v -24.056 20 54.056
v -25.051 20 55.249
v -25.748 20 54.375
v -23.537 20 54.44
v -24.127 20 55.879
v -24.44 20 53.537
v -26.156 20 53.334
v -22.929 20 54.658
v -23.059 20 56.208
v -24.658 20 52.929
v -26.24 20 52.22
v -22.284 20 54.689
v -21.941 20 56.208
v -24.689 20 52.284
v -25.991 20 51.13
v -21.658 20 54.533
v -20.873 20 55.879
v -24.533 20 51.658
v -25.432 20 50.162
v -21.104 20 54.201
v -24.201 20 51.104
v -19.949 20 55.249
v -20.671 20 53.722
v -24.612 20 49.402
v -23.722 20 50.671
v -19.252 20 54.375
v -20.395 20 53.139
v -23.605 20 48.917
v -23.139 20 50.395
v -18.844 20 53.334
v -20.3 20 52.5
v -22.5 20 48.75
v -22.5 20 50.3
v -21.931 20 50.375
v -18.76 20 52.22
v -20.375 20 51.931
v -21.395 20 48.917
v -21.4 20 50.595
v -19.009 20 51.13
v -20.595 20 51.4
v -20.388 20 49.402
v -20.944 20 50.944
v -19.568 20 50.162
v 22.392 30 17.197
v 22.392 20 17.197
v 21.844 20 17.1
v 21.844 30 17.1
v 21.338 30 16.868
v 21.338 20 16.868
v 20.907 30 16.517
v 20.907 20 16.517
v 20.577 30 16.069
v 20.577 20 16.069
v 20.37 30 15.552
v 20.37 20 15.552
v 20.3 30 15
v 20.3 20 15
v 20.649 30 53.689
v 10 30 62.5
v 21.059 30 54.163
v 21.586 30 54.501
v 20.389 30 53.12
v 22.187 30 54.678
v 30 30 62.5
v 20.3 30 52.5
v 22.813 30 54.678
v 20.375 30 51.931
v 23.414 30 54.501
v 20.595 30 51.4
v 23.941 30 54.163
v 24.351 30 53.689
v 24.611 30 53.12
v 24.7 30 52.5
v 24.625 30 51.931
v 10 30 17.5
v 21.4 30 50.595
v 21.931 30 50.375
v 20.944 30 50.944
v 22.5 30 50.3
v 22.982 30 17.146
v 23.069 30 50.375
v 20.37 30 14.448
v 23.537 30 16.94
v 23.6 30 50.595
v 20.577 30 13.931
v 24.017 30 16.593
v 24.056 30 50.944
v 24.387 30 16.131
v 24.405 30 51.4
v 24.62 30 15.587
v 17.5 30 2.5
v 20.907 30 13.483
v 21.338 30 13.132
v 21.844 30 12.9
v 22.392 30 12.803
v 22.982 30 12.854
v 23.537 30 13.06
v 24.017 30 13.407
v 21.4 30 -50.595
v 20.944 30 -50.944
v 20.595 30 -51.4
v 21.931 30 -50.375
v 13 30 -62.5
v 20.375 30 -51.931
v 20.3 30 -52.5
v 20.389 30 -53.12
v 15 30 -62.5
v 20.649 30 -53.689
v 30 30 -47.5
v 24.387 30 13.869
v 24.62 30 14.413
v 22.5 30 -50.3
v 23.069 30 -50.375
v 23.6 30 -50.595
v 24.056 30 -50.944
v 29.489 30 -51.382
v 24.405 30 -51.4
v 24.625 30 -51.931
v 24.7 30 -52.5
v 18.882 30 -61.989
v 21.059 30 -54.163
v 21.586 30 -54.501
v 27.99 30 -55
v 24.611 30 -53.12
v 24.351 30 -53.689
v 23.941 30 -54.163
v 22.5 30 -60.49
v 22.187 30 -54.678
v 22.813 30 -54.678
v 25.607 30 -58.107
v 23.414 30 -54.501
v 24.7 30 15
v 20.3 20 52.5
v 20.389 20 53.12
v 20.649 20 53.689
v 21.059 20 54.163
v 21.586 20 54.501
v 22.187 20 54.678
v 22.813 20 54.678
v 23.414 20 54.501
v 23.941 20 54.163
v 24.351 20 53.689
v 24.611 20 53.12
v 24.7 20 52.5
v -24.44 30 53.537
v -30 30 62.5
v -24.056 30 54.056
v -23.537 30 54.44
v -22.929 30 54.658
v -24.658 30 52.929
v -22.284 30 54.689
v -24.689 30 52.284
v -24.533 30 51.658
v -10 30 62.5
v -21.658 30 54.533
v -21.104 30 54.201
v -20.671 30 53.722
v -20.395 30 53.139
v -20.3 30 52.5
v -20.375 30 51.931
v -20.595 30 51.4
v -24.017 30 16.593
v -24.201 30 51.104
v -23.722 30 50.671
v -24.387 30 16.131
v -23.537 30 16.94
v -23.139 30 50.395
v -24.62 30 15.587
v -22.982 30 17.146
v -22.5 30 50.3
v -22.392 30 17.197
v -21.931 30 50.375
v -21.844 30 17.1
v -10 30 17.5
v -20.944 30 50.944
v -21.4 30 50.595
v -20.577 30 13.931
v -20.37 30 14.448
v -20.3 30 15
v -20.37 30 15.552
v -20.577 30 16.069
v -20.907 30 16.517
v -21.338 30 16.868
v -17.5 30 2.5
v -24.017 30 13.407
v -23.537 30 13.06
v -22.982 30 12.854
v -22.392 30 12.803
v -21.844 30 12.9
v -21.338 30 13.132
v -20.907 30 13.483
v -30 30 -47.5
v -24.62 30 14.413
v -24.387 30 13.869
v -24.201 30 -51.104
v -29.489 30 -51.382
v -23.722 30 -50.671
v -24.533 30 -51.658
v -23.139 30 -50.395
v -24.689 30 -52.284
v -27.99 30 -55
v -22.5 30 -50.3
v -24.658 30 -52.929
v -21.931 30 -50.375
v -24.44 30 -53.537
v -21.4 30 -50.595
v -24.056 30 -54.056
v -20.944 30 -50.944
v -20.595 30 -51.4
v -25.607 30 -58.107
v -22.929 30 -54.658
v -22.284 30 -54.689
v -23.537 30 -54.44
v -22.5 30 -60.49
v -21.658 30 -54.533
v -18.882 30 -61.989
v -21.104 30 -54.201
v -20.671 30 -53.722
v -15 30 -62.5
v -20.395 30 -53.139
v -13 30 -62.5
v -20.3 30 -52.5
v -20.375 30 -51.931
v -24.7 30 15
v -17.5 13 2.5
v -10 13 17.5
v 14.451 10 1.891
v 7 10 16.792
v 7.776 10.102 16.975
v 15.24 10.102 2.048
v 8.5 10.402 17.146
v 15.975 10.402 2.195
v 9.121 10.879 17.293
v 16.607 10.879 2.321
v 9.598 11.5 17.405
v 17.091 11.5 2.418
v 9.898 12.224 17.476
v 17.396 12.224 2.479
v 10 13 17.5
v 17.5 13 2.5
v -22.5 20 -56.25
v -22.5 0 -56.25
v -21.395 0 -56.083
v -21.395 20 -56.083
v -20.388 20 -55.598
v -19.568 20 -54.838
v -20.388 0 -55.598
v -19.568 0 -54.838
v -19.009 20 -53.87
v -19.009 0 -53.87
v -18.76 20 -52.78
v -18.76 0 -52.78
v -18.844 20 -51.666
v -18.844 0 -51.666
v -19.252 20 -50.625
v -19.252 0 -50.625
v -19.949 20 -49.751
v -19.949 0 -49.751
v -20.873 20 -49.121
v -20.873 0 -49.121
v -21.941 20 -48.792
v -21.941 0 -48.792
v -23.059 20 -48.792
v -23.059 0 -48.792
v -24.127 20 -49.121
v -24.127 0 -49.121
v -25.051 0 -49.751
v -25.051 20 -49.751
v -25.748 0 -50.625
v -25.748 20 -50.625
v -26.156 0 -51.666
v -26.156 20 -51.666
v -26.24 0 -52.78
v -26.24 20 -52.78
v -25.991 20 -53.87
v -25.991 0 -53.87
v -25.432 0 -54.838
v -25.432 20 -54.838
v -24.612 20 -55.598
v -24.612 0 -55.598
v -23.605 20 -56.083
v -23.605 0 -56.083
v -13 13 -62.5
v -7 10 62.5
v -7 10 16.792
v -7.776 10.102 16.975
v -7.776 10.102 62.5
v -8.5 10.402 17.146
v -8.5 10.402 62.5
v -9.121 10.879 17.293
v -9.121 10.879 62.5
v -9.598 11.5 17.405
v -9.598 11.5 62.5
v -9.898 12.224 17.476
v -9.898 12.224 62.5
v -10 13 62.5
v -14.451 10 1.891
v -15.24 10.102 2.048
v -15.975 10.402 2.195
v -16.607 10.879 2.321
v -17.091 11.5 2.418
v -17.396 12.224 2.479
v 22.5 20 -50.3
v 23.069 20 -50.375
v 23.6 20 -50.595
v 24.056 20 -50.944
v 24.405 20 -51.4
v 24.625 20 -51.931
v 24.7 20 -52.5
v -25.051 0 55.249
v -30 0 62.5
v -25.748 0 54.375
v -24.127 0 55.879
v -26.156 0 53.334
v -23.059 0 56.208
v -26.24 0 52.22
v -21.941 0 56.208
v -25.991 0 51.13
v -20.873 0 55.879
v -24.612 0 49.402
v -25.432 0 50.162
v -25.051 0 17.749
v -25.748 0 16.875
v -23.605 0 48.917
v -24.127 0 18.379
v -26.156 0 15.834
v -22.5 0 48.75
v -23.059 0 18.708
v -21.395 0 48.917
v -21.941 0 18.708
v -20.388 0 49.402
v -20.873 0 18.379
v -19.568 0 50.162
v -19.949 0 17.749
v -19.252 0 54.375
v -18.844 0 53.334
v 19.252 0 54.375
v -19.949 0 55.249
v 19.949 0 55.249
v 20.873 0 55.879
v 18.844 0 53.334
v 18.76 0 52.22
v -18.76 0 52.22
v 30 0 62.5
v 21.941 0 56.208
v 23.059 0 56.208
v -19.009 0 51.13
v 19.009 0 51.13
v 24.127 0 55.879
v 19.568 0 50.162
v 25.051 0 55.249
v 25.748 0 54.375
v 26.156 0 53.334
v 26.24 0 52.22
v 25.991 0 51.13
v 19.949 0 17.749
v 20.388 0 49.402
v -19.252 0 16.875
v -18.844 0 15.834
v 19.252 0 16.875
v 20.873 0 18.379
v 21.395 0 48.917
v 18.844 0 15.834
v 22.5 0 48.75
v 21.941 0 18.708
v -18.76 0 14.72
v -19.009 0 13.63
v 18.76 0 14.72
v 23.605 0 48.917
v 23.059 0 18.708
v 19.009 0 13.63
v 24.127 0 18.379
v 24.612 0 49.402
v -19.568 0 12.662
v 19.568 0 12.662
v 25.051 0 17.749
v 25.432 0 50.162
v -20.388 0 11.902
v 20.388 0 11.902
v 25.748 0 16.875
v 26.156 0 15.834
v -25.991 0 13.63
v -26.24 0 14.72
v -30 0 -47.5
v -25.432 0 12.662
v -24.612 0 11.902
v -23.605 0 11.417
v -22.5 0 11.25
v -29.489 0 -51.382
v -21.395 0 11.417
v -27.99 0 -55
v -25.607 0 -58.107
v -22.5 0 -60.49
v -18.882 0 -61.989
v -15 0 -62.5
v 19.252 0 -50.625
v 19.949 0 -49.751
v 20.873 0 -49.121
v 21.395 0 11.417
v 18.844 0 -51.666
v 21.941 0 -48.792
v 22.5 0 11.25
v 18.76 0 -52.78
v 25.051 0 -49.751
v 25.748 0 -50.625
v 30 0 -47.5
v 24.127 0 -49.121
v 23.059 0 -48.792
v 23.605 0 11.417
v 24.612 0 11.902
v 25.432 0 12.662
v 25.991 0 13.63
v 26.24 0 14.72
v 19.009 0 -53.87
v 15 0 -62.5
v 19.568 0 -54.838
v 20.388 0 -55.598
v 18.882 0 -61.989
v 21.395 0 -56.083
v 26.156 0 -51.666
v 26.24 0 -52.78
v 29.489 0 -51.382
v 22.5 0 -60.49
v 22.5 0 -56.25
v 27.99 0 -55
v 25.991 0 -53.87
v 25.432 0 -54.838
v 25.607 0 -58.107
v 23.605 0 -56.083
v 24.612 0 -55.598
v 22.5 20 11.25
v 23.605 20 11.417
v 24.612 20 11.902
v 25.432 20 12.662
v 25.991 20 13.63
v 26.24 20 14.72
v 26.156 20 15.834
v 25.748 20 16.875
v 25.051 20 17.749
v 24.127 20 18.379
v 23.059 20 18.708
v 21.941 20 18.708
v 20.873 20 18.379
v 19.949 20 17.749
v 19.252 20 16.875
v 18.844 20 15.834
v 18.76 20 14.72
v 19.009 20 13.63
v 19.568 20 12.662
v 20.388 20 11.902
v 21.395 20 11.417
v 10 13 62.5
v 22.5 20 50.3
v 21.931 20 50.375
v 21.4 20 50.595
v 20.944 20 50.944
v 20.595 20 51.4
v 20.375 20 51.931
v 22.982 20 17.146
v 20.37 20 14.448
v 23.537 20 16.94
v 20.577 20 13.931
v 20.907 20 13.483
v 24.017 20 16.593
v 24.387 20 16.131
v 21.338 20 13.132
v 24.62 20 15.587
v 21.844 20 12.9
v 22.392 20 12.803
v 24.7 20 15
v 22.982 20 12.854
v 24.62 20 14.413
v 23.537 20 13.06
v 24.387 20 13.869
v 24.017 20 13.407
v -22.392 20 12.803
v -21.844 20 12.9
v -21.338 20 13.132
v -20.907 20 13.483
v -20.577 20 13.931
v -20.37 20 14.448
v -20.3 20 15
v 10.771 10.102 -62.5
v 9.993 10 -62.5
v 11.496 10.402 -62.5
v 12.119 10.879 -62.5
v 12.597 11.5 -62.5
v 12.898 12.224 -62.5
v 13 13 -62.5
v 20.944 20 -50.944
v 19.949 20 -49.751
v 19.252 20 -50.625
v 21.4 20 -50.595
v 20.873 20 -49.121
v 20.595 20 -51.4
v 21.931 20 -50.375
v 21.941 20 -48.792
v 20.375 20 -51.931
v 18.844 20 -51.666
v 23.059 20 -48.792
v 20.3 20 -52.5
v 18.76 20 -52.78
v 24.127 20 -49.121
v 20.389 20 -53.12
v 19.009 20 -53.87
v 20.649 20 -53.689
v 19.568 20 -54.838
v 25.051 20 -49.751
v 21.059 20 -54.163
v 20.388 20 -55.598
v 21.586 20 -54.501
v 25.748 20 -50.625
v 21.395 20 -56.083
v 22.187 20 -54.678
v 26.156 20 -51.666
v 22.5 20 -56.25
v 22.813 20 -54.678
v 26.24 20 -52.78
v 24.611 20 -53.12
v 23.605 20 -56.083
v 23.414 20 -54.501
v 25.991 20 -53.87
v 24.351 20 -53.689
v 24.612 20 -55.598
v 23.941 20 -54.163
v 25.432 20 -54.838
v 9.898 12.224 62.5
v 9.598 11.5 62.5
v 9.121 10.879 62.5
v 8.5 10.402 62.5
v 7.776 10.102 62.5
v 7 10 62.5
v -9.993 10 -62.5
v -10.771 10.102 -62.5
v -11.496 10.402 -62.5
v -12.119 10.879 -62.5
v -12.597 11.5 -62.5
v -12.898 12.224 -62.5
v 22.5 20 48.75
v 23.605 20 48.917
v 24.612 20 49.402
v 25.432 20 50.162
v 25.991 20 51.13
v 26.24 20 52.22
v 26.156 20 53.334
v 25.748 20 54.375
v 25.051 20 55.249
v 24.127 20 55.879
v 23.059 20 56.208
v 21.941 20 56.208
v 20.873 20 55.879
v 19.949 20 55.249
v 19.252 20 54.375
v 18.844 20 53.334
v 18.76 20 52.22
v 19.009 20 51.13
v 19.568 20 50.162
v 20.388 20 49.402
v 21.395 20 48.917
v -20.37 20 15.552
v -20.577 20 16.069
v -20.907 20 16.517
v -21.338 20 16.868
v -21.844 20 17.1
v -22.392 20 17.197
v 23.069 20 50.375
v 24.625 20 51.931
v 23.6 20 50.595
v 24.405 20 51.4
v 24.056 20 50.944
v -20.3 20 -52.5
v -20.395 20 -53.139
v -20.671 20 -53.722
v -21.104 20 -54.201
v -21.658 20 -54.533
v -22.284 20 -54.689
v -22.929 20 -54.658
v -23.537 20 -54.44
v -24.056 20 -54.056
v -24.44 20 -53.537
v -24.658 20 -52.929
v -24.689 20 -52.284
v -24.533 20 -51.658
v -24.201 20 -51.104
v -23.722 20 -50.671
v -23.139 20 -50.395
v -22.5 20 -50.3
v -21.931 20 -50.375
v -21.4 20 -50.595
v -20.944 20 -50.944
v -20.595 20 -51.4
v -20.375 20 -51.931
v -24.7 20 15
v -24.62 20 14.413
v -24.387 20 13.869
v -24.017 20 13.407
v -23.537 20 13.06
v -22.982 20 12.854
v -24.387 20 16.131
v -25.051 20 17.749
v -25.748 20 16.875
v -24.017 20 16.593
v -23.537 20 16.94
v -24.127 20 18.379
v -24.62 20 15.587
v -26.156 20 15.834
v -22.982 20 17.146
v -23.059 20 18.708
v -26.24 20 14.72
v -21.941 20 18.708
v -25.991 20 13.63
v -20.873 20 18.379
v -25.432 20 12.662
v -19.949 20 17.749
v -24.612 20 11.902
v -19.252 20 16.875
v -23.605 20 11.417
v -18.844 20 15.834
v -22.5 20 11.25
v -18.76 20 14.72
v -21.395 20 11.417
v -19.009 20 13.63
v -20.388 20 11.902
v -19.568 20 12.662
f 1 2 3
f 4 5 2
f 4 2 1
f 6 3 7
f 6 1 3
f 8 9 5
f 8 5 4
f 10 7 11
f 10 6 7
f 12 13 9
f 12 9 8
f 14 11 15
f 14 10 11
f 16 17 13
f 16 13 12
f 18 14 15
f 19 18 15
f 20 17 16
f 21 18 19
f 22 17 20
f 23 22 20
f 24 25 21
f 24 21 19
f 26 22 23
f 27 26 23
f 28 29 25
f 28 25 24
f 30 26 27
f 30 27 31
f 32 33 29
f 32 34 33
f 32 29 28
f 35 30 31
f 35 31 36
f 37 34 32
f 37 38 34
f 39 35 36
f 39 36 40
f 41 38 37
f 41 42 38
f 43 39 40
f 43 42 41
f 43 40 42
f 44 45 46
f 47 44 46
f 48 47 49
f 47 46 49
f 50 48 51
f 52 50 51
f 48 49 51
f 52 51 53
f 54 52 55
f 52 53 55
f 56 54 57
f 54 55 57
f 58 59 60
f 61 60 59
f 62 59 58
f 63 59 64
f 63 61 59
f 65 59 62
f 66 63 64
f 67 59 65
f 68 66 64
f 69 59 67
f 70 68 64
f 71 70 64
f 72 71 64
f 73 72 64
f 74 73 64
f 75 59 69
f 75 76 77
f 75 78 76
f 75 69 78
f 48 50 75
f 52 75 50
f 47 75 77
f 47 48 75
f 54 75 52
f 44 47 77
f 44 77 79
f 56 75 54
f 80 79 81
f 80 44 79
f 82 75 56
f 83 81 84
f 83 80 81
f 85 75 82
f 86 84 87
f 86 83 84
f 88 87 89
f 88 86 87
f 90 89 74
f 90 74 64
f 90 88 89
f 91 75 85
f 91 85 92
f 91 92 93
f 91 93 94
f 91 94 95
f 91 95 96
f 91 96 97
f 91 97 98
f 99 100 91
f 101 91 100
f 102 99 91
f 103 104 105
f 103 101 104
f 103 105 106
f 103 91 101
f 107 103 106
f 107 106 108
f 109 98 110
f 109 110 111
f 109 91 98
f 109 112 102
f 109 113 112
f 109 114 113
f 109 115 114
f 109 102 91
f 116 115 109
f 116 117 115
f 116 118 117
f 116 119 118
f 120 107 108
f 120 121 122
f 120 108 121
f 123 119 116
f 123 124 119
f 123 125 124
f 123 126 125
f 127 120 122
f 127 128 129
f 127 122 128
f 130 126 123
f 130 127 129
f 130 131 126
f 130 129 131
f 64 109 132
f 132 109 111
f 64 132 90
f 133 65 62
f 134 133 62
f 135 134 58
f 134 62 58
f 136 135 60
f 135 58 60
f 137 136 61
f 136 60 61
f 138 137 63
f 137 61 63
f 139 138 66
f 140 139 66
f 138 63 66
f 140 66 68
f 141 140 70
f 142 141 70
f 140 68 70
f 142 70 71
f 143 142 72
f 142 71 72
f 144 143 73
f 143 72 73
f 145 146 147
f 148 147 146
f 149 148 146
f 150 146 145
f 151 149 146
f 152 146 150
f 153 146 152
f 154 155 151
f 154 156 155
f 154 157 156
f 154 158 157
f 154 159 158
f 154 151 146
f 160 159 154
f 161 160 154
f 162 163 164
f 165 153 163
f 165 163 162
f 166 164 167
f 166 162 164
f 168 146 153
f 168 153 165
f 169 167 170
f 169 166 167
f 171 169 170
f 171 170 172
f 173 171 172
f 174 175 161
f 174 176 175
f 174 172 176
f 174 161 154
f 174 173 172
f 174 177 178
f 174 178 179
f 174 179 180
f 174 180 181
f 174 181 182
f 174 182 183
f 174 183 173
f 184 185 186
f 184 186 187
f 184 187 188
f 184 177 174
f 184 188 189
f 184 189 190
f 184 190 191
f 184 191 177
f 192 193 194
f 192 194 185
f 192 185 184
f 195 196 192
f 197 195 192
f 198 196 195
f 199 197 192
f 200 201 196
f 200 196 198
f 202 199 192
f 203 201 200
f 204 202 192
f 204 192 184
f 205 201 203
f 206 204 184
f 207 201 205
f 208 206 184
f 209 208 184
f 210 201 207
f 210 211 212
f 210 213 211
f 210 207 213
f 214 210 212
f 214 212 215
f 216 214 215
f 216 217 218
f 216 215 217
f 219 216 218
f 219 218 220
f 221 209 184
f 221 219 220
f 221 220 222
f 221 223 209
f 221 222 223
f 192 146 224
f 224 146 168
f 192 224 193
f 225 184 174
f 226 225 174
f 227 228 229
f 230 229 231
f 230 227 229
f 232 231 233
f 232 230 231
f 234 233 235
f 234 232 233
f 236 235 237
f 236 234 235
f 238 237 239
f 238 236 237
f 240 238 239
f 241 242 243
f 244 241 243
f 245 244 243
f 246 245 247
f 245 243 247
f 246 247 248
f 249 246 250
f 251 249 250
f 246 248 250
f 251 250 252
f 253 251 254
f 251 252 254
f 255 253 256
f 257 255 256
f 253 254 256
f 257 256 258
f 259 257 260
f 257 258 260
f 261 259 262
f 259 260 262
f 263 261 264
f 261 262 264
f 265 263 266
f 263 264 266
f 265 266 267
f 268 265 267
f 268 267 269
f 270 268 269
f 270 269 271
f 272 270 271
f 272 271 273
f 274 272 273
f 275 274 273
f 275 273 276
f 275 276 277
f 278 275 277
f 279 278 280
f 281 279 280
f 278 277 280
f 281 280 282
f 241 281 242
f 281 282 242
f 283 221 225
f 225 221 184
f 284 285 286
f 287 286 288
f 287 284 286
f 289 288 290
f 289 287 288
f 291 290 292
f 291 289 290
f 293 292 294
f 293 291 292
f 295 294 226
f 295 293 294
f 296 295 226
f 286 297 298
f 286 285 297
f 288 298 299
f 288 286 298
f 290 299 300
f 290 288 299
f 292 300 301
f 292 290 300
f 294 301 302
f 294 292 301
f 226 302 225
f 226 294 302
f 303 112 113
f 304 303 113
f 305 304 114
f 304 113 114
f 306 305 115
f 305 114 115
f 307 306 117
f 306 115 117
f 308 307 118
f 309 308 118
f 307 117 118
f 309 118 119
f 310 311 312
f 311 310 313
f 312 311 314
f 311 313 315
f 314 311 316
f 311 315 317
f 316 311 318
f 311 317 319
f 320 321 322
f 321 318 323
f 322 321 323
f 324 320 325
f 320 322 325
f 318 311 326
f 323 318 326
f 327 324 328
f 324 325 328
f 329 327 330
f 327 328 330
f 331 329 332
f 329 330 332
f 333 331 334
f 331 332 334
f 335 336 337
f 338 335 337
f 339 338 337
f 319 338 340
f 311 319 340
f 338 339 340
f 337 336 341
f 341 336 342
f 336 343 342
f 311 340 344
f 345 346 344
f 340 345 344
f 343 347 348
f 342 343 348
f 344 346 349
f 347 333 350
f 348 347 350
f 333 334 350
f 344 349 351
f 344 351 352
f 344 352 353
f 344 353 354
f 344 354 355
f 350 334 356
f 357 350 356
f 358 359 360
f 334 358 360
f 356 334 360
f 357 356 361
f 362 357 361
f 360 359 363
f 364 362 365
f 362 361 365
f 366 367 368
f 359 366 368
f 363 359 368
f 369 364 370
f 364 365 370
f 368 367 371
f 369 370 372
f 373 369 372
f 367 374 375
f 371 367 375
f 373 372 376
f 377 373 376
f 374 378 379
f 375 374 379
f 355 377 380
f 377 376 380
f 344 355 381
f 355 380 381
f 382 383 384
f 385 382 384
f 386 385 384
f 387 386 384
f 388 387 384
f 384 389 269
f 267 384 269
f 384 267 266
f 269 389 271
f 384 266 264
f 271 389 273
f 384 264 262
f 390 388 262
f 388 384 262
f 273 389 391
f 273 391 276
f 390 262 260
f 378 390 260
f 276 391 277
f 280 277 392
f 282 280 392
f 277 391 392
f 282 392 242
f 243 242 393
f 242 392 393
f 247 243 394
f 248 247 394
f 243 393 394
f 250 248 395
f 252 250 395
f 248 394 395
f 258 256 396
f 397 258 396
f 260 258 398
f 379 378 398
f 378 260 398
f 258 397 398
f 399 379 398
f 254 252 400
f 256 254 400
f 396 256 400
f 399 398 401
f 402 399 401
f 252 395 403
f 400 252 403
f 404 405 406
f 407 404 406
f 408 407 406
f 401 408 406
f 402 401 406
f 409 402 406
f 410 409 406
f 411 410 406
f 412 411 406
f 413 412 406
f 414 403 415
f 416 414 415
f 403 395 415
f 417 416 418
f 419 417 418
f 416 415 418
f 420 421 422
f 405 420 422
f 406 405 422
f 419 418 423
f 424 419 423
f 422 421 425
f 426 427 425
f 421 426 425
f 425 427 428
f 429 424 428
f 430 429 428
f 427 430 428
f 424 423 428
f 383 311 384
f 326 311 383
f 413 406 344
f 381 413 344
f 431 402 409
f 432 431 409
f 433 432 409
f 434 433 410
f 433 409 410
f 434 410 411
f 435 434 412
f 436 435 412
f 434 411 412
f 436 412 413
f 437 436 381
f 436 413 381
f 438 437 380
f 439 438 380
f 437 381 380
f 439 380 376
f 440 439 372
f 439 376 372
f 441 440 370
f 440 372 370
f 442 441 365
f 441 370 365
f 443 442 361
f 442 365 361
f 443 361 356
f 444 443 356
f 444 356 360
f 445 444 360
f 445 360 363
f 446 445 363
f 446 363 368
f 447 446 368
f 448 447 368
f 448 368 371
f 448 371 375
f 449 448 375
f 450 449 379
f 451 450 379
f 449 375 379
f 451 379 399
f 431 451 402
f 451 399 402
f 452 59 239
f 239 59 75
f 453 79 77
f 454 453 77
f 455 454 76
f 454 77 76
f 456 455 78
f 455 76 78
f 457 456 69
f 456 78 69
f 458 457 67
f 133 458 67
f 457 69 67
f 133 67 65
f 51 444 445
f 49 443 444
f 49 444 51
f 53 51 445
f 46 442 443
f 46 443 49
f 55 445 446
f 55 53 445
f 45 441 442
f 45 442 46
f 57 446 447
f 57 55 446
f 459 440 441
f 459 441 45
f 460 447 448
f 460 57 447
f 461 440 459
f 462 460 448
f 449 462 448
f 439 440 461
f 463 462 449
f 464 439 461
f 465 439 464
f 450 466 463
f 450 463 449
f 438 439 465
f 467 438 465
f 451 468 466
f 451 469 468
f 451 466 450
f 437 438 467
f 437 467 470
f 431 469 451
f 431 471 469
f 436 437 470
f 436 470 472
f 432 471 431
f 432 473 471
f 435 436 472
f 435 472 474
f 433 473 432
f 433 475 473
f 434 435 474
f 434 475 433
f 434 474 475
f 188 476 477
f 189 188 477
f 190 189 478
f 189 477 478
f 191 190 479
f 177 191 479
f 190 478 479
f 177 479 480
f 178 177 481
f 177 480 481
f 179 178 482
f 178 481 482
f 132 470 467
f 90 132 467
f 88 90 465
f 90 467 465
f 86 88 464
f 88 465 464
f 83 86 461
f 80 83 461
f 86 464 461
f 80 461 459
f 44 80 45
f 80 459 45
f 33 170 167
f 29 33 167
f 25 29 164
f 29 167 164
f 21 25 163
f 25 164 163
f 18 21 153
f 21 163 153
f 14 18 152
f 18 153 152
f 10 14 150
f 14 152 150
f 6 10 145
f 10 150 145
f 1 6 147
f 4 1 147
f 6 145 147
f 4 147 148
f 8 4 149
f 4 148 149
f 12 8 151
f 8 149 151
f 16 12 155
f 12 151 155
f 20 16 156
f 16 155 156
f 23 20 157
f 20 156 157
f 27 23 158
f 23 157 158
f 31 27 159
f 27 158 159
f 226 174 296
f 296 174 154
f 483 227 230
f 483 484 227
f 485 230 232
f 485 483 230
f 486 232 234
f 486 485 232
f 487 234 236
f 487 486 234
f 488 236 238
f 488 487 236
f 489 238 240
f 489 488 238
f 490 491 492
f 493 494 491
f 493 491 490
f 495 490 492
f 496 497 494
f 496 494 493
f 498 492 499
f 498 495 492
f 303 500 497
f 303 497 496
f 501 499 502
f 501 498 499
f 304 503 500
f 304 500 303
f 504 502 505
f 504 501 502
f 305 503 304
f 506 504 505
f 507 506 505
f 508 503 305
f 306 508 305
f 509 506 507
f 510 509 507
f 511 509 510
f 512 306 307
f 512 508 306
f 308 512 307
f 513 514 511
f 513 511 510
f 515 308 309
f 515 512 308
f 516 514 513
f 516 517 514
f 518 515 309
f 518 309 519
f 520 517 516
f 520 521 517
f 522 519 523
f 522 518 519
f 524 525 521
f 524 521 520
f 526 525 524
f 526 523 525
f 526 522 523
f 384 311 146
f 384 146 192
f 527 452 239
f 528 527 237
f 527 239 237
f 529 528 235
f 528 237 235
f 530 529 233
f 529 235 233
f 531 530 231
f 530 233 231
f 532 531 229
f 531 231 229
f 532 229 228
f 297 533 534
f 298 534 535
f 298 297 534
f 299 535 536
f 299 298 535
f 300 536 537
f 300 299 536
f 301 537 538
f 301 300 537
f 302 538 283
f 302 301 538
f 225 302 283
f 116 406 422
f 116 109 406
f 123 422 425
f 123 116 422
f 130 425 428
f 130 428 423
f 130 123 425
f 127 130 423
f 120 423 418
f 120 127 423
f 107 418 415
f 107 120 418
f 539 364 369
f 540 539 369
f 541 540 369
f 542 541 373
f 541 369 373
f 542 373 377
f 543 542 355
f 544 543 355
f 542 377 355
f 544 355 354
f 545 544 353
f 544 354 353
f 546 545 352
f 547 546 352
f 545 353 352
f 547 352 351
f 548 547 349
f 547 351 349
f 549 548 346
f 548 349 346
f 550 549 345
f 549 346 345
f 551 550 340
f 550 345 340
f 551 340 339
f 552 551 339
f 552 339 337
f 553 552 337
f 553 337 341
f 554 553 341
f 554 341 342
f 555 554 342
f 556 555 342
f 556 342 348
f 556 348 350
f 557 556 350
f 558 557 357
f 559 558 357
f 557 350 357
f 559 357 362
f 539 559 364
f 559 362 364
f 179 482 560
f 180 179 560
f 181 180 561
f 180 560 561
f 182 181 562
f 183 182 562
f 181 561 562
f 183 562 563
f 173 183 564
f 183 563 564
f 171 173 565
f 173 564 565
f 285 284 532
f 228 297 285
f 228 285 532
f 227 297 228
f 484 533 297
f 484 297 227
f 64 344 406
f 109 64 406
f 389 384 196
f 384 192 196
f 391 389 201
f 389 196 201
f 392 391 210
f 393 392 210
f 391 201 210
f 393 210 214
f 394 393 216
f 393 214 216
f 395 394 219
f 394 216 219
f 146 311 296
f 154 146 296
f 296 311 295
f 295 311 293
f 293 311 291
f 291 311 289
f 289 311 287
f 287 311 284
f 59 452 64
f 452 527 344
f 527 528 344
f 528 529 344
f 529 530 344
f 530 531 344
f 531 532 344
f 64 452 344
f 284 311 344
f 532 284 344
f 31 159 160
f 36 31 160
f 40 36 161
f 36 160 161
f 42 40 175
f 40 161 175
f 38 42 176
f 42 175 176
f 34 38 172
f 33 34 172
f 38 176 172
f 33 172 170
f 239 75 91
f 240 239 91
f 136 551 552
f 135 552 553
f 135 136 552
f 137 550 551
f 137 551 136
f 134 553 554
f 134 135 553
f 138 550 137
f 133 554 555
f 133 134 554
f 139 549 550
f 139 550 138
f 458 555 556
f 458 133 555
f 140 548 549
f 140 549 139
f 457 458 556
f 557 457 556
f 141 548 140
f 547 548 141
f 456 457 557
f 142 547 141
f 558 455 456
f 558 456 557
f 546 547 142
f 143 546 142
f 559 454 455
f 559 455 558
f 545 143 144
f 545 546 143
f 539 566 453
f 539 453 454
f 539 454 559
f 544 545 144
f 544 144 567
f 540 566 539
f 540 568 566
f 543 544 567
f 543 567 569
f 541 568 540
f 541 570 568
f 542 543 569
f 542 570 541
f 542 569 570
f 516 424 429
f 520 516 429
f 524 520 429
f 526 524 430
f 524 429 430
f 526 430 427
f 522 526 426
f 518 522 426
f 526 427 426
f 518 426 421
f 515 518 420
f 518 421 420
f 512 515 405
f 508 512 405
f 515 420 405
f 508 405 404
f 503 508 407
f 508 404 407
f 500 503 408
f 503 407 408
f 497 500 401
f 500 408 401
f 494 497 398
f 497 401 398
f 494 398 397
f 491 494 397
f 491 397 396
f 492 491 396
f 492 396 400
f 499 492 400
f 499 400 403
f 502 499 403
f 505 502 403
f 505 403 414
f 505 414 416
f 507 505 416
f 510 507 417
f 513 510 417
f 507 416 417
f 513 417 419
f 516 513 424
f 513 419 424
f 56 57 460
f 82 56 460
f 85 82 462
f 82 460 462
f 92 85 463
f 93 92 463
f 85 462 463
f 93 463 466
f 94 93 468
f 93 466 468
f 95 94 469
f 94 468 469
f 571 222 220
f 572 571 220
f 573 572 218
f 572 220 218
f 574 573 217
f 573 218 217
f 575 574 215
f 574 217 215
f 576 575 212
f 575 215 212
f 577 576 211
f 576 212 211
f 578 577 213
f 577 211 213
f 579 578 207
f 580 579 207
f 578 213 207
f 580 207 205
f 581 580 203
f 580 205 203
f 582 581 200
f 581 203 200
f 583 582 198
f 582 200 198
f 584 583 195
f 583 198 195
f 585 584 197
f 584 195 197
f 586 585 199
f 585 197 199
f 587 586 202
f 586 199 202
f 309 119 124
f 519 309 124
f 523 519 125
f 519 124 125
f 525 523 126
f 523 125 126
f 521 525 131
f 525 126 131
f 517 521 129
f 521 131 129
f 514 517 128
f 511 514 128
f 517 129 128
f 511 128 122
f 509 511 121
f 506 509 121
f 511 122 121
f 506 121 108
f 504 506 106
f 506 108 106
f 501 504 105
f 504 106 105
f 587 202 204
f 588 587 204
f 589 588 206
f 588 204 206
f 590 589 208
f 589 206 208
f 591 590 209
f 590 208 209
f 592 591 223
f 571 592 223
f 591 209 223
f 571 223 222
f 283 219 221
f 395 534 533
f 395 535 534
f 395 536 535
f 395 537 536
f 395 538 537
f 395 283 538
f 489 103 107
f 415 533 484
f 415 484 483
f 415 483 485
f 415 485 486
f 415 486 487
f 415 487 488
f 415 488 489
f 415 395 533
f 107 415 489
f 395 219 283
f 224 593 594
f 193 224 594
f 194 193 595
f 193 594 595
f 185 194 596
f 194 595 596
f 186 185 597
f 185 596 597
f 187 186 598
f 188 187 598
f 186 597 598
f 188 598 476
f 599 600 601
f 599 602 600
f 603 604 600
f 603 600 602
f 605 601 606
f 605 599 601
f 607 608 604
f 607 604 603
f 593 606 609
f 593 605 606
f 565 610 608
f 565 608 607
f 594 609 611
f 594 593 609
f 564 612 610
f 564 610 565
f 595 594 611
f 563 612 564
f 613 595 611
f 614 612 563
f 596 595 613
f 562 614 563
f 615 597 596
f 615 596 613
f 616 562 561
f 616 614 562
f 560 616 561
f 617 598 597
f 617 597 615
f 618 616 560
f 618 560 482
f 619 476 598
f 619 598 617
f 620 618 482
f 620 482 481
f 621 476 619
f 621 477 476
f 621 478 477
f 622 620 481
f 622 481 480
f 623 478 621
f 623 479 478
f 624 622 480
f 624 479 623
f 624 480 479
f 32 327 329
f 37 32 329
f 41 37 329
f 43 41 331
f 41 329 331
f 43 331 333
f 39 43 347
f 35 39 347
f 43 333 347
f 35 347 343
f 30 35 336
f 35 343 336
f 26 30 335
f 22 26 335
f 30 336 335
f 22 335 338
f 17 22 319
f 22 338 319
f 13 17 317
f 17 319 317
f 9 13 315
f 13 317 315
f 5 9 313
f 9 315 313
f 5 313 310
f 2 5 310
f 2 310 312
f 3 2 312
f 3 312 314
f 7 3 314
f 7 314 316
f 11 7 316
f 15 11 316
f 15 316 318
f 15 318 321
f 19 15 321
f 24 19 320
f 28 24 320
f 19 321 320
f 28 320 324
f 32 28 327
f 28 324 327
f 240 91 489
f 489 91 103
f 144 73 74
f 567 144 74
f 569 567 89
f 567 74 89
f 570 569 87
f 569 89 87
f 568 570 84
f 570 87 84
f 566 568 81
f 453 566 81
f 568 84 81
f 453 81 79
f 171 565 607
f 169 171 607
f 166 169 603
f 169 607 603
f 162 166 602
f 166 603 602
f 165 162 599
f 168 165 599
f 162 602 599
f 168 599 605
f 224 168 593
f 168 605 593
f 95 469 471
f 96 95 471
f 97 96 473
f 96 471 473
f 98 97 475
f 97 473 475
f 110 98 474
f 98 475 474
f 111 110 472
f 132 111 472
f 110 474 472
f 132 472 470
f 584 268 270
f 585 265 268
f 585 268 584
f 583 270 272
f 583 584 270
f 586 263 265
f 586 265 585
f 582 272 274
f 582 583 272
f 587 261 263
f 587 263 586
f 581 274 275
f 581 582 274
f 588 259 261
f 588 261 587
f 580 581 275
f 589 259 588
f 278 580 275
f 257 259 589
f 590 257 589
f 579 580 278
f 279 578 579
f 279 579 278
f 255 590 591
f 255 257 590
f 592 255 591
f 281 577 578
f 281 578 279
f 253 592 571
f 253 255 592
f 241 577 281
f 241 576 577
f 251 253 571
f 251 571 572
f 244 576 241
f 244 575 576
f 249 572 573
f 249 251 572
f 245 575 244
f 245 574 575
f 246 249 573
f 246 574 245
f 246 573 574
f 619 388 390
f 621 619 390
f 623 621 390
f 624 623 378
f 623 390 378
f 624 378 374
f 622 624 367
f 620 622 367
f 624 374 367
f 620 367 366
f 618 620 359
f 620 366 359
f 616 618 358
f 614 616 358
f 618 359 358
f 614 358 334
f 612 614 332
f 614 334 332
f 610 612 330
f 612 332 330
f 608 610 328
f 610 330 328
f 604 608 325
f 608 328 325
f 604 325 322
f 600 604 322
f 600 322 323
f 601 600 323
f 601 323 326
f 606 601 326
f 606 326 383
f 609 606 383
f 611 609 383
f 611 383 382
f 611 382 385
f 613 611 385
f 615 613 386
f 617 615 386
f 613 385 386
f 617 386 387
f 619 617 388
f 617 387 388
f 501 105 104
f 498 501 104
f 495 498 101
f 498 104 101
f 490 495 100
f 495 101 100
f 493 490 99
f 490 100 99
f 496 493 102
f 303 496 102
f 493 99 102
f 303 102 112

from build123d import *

# Parameters (mm, degrees)
SKETCH_1_W          = 60
SKETCH_1_H          = 125
EXTRUDE_1_DEPTH     = 30
CUT_EXTRUDE_1_DEPTH = 76.539724649
CUT_EXTRUDE_2_DEPTH = 76.539724649
SKETCH_4_W          = 13
SKETCH_4_H          = 65
CUT_EXTRUDE_3_DEPTH = 20
FILLET_1_R          = 3
FILLET_2_R          = 15
SKETCH_5_R          = 3.75
CUT_EXTRUDE_4_DEPTH = 20


with BuildPart() as part:
    # 草图1 → 凸台-拉伸1 (new body)
    with BuildSketch(Plane(origin=(0, 0, 0), x_dir=(1, 0, 0), z_dir=(0, 1, 0))):
        Rectangle(SKETCH_1_W, SKETCH_1_H)
    extrude(amount=EXTRUDE_1_DEPTH)

    # 草图2 → 切除-拉伸1 (cut, through all)
    with BuildSketch(Plane(origin=(0, 30, 0), x_dir=(1, 0, 0), z_dir=(0, 1, 0))):
        with BuildLine():
            ThreePointArc((-20.3, -52.5), (-20.944365081, -50.944365081), (-22.5, -50.3))
            Line((-22.5, -50.3), (-22.5, -52.5))
            Line((-22.5, -52.5), (-20.3, -52.5))
        make_face()
        with BuildLine():
            Line((-22.5, -52.5), (-22.5, -50.3))
            ThreePointArc((-22.5, -50.3), (-24.055634919, -54.055634919), (-20.3, -52.5))
            Line((-20.3, -52.5), (-22.5, -52.5))
        make_face()
        with BuildLine():
            ThreePointArc((24.7, -52.5), (24.055634919, -50.944365081), (22.5, -50.3))
            Line((22.5, -50.3), (22.5, -52.5))
            Line((22.5, -52.5), (20.3, -52.5))
            ThreePointArc((20.3, -52.5), (22.5, -54.7), (24.7, -52.5))
        make_face()
        with BuildLine():
            Line((22.5, -52.5), (22.5, -50.3))
            ThreePointArc((22.5, -50.3), (20.944365081, -50.944365081), (20.3, -52.5))
            Line((20.3, -52.5), (22.5, -52.5))
        make_face()
        with BuildLine():
            ThreePointArc((-20.3, 52.5), (-24.055634919, 54.055634919), (-22.5, 50.3))
            Line((-22.5, 50.3), (-22.5, 52.5))
            Line((-22.5, 52.5), (-20.3, 52.5))
        make_face()
        with BuildLine():
            Line((-22.5, 52.5), (-22.5, 50.3))
            ThreePointArc((-22.5, 50.3), (-20.944365081, 50.944365081), (-20.3, 52.5))
            Line((-20.3, 52.5), (-22.5, 52.5))
        make_face()
        with BuildLine():
            ThreePointArc((20.3, 52.5), (20.944365081, 50.944365081), (22.5, 50.3))
            Line((22.5, 50.3), (22.5, 52.5))
            Line((22.5, 52.5), (20.3, 52.5))
        make_face()
        with BuildLine():
            Line((22.5, 52.5), (22.5, 50.3))
            ThreePointArc((22.5, 50.3), (24.055634919, 50.944365081), (24.7, 52.5))
            ThreePointArc((24.7, 52.5), (22.5, 54.7), (20.3, 52.5))
            Line((20.3, 52.5), (22.5, 52.5))
        make_face()
    extrude(amount=-CUT_EXTRUDE_1_DEPTH, mode=Mode.SUBTRACT)

    # 草图3 → 切除-拉伸2 (cut, through all)
    with BuildSketch(Plane(origin=(0, 0, 0), x_dir=(-1, 0, 0), z_dir=(0, -1, 0))):
        with BuildLine():
            ThreePointArc((-20.3, -15), (-20.906792195, -13.482868203), (-22.392444444, -12.802630709))
            ThreePointArc((-22.392444444, -12.802630709), (-22.473095025, -13.9), (-22.5, -15))
            Line((-22.5, -15), (-20.3, -15))
        make_face()
        with BuildLine():
            ThreePointArc((-22.5, -15), (-22.473095025, -13.9), (-22.392444444, -12.802630709))
            ThreePointArc((-22.392444444, -12.802630709), (-24.017131797, -13.406792195), (-24.7, -15))
            Line((-24.7, -15), (-22.5, -15))
        make_face()
        with BuildLine():
            ThreePointArc((-24.7, -15), (-24.017131797, -16.593207805), (-22.392444444, -17.197369291))
            ThreePointArc((-22.392444444, -17.197369291), (-22.473095025, -16.1), (-22.5, -15))
            Line((-22.5, -15), (-24.7, -15))
        make_face()
        with BuildLine():
            ThreePointArc((-22.5, -15), (-22.473095025, -16.1), (-22.392444444, -17.197369291))
            ThreePointArc((-22.392444444, -17.197369291), (-20.906792195, -16.517131797), (-20.3, -15))
            Line((-20.3, -15), (-22.5, -15))
        make_face()
        with BuildLine():
            ThreePointArc((22.392444444, -17.197369291), (24.017131797, -16.593207805), (24.7, -15))
            Line((24.7, -15), (22.5, -15))
            ThreePointArc((22.5, -15), (22.473095025, -16.1), (22.392444444, -17.197369291))
        make_face()
        with BuildLine():
            Line((22.5, -15), (24.7, -15))
            ThreePointArc((24.7, -15), (24.017131797, -13.406792195), (22.392444444, -12.802630709))
            ThreePointArc((22.392444444, -12.802630709), (22.473095025, -13.9), (22.5, -15))
        make_face()
        with BuildLine():
            ThreePointArc((22.392444444, -17.197369291), (22.473095025, -16.1), (22.5, -15))
            Line((22.5, -15), (20.3, -15))
            ThreePointArc((20.3, -15), (20.906792195, -16.517131797), (22.392444444, -17.197369291))
        make_face()
        with BuildLine():
            Line((20.3, -15), (22.5, -15))
            ThreePointArc((22.5, -15), (22.473095025, -13.9), (22.392444444, -12.802630709))
            ThreePointArc((22.392444444, -12.802630709), (20.906792195, -13.482868203), (20.3, -15))
        make_face()
    extrude(amount=-CUT_EXTRUDE_2_DEPTH, mode=Mode.SUBTRACT)

    # 草图4 → 切除-拉伸3 (cut)
    with BuildSketch(Plane(origin=(0, 30, 0), x_dir=(1, 0, 0), z_dir=(0, 1, 0))):
        Polygon((0, -2.5), (0, -62.5), (10, -62.5), (10, -17.5), (17.5, -2.5), (13, -2.5), align=None)
        Polygon((-10, -62.5), (0, -62.5), (0, -2.5), (-13, -2.5), (-17.5, -2.5), (-10, -17.5), align=None)
        Polygon((-17.5, -2.5), (-13, -2.5), (-13, 62.5), align=None)
        with Locations((-6.5, 30)):
            Rectangle(SKETCH_4_W, SKETCH_4_H)
        with Locations((6.5, 30)):
            Rectangle(SKETCH_4_W, SKETCH_4_H)
        Polygon((13, 62.5), (13, -2.5), (17.5, -2.5), align=None)
    extrude(amount=-CUT_EXTRUDE_3_DEPTH, mode=Mode.SUBTRACT)

    # 圆角1
    fillet_1_edges = [part.edges().sort_by_distance(p)[0] for p in [
        (10, 10, 40),
        (-15.25, 10, -30),
        (15.25, 10, -30),
        (13.75, 10, 10),
        (-10, 10, 40),
        (-13.75, 10, 10),
    ]]
    fillet(fillet_1_edges, radius=FILLET_1_R)

    # 圆角2
    fillet_2_edges = [part.edges().sort_by_distance(p)[0] for p in [
        (-30, 15, -62.5),
        (30, 15, -62.5),
    ]]
    fillet(fillet_2_edges, radius=FILLET_2_R)

    # 草图5 → 切除-拉伸4 (cut)
    with BuildSketch(Plane.XZ):
        with Locations(Location((-22.5, -52.5, 0), (0, 0, 270))):
            Circle(SKETCH_5_R)
        with Locations(Location((22.5, -52.5, 0), (0, 0, 270))):
            Circle(SKETCH_5_R)
        with Locations(Location((-22.5, 15, 0), (0, 0, 270))):
            Circle(SKETCH_5_R)
        with Locations(Location((22.5, 15, 0), (0, 0, 270))):
            Circle(SKETCH_5_R)
        with Locations(Location((-22.5, 52.5, 0), (0, 0, 270))):
            Circle(SKETCH_5_R)
        with Locations(Location((22.5, 52.5, 0), (0, 0, 270))):
            Circle(SKETCH_5_R)
    extrude(amount=-CUT_EXTRUDE_4_DEPTH, mode=Mode.SUBTRACT)


solid = part.part
